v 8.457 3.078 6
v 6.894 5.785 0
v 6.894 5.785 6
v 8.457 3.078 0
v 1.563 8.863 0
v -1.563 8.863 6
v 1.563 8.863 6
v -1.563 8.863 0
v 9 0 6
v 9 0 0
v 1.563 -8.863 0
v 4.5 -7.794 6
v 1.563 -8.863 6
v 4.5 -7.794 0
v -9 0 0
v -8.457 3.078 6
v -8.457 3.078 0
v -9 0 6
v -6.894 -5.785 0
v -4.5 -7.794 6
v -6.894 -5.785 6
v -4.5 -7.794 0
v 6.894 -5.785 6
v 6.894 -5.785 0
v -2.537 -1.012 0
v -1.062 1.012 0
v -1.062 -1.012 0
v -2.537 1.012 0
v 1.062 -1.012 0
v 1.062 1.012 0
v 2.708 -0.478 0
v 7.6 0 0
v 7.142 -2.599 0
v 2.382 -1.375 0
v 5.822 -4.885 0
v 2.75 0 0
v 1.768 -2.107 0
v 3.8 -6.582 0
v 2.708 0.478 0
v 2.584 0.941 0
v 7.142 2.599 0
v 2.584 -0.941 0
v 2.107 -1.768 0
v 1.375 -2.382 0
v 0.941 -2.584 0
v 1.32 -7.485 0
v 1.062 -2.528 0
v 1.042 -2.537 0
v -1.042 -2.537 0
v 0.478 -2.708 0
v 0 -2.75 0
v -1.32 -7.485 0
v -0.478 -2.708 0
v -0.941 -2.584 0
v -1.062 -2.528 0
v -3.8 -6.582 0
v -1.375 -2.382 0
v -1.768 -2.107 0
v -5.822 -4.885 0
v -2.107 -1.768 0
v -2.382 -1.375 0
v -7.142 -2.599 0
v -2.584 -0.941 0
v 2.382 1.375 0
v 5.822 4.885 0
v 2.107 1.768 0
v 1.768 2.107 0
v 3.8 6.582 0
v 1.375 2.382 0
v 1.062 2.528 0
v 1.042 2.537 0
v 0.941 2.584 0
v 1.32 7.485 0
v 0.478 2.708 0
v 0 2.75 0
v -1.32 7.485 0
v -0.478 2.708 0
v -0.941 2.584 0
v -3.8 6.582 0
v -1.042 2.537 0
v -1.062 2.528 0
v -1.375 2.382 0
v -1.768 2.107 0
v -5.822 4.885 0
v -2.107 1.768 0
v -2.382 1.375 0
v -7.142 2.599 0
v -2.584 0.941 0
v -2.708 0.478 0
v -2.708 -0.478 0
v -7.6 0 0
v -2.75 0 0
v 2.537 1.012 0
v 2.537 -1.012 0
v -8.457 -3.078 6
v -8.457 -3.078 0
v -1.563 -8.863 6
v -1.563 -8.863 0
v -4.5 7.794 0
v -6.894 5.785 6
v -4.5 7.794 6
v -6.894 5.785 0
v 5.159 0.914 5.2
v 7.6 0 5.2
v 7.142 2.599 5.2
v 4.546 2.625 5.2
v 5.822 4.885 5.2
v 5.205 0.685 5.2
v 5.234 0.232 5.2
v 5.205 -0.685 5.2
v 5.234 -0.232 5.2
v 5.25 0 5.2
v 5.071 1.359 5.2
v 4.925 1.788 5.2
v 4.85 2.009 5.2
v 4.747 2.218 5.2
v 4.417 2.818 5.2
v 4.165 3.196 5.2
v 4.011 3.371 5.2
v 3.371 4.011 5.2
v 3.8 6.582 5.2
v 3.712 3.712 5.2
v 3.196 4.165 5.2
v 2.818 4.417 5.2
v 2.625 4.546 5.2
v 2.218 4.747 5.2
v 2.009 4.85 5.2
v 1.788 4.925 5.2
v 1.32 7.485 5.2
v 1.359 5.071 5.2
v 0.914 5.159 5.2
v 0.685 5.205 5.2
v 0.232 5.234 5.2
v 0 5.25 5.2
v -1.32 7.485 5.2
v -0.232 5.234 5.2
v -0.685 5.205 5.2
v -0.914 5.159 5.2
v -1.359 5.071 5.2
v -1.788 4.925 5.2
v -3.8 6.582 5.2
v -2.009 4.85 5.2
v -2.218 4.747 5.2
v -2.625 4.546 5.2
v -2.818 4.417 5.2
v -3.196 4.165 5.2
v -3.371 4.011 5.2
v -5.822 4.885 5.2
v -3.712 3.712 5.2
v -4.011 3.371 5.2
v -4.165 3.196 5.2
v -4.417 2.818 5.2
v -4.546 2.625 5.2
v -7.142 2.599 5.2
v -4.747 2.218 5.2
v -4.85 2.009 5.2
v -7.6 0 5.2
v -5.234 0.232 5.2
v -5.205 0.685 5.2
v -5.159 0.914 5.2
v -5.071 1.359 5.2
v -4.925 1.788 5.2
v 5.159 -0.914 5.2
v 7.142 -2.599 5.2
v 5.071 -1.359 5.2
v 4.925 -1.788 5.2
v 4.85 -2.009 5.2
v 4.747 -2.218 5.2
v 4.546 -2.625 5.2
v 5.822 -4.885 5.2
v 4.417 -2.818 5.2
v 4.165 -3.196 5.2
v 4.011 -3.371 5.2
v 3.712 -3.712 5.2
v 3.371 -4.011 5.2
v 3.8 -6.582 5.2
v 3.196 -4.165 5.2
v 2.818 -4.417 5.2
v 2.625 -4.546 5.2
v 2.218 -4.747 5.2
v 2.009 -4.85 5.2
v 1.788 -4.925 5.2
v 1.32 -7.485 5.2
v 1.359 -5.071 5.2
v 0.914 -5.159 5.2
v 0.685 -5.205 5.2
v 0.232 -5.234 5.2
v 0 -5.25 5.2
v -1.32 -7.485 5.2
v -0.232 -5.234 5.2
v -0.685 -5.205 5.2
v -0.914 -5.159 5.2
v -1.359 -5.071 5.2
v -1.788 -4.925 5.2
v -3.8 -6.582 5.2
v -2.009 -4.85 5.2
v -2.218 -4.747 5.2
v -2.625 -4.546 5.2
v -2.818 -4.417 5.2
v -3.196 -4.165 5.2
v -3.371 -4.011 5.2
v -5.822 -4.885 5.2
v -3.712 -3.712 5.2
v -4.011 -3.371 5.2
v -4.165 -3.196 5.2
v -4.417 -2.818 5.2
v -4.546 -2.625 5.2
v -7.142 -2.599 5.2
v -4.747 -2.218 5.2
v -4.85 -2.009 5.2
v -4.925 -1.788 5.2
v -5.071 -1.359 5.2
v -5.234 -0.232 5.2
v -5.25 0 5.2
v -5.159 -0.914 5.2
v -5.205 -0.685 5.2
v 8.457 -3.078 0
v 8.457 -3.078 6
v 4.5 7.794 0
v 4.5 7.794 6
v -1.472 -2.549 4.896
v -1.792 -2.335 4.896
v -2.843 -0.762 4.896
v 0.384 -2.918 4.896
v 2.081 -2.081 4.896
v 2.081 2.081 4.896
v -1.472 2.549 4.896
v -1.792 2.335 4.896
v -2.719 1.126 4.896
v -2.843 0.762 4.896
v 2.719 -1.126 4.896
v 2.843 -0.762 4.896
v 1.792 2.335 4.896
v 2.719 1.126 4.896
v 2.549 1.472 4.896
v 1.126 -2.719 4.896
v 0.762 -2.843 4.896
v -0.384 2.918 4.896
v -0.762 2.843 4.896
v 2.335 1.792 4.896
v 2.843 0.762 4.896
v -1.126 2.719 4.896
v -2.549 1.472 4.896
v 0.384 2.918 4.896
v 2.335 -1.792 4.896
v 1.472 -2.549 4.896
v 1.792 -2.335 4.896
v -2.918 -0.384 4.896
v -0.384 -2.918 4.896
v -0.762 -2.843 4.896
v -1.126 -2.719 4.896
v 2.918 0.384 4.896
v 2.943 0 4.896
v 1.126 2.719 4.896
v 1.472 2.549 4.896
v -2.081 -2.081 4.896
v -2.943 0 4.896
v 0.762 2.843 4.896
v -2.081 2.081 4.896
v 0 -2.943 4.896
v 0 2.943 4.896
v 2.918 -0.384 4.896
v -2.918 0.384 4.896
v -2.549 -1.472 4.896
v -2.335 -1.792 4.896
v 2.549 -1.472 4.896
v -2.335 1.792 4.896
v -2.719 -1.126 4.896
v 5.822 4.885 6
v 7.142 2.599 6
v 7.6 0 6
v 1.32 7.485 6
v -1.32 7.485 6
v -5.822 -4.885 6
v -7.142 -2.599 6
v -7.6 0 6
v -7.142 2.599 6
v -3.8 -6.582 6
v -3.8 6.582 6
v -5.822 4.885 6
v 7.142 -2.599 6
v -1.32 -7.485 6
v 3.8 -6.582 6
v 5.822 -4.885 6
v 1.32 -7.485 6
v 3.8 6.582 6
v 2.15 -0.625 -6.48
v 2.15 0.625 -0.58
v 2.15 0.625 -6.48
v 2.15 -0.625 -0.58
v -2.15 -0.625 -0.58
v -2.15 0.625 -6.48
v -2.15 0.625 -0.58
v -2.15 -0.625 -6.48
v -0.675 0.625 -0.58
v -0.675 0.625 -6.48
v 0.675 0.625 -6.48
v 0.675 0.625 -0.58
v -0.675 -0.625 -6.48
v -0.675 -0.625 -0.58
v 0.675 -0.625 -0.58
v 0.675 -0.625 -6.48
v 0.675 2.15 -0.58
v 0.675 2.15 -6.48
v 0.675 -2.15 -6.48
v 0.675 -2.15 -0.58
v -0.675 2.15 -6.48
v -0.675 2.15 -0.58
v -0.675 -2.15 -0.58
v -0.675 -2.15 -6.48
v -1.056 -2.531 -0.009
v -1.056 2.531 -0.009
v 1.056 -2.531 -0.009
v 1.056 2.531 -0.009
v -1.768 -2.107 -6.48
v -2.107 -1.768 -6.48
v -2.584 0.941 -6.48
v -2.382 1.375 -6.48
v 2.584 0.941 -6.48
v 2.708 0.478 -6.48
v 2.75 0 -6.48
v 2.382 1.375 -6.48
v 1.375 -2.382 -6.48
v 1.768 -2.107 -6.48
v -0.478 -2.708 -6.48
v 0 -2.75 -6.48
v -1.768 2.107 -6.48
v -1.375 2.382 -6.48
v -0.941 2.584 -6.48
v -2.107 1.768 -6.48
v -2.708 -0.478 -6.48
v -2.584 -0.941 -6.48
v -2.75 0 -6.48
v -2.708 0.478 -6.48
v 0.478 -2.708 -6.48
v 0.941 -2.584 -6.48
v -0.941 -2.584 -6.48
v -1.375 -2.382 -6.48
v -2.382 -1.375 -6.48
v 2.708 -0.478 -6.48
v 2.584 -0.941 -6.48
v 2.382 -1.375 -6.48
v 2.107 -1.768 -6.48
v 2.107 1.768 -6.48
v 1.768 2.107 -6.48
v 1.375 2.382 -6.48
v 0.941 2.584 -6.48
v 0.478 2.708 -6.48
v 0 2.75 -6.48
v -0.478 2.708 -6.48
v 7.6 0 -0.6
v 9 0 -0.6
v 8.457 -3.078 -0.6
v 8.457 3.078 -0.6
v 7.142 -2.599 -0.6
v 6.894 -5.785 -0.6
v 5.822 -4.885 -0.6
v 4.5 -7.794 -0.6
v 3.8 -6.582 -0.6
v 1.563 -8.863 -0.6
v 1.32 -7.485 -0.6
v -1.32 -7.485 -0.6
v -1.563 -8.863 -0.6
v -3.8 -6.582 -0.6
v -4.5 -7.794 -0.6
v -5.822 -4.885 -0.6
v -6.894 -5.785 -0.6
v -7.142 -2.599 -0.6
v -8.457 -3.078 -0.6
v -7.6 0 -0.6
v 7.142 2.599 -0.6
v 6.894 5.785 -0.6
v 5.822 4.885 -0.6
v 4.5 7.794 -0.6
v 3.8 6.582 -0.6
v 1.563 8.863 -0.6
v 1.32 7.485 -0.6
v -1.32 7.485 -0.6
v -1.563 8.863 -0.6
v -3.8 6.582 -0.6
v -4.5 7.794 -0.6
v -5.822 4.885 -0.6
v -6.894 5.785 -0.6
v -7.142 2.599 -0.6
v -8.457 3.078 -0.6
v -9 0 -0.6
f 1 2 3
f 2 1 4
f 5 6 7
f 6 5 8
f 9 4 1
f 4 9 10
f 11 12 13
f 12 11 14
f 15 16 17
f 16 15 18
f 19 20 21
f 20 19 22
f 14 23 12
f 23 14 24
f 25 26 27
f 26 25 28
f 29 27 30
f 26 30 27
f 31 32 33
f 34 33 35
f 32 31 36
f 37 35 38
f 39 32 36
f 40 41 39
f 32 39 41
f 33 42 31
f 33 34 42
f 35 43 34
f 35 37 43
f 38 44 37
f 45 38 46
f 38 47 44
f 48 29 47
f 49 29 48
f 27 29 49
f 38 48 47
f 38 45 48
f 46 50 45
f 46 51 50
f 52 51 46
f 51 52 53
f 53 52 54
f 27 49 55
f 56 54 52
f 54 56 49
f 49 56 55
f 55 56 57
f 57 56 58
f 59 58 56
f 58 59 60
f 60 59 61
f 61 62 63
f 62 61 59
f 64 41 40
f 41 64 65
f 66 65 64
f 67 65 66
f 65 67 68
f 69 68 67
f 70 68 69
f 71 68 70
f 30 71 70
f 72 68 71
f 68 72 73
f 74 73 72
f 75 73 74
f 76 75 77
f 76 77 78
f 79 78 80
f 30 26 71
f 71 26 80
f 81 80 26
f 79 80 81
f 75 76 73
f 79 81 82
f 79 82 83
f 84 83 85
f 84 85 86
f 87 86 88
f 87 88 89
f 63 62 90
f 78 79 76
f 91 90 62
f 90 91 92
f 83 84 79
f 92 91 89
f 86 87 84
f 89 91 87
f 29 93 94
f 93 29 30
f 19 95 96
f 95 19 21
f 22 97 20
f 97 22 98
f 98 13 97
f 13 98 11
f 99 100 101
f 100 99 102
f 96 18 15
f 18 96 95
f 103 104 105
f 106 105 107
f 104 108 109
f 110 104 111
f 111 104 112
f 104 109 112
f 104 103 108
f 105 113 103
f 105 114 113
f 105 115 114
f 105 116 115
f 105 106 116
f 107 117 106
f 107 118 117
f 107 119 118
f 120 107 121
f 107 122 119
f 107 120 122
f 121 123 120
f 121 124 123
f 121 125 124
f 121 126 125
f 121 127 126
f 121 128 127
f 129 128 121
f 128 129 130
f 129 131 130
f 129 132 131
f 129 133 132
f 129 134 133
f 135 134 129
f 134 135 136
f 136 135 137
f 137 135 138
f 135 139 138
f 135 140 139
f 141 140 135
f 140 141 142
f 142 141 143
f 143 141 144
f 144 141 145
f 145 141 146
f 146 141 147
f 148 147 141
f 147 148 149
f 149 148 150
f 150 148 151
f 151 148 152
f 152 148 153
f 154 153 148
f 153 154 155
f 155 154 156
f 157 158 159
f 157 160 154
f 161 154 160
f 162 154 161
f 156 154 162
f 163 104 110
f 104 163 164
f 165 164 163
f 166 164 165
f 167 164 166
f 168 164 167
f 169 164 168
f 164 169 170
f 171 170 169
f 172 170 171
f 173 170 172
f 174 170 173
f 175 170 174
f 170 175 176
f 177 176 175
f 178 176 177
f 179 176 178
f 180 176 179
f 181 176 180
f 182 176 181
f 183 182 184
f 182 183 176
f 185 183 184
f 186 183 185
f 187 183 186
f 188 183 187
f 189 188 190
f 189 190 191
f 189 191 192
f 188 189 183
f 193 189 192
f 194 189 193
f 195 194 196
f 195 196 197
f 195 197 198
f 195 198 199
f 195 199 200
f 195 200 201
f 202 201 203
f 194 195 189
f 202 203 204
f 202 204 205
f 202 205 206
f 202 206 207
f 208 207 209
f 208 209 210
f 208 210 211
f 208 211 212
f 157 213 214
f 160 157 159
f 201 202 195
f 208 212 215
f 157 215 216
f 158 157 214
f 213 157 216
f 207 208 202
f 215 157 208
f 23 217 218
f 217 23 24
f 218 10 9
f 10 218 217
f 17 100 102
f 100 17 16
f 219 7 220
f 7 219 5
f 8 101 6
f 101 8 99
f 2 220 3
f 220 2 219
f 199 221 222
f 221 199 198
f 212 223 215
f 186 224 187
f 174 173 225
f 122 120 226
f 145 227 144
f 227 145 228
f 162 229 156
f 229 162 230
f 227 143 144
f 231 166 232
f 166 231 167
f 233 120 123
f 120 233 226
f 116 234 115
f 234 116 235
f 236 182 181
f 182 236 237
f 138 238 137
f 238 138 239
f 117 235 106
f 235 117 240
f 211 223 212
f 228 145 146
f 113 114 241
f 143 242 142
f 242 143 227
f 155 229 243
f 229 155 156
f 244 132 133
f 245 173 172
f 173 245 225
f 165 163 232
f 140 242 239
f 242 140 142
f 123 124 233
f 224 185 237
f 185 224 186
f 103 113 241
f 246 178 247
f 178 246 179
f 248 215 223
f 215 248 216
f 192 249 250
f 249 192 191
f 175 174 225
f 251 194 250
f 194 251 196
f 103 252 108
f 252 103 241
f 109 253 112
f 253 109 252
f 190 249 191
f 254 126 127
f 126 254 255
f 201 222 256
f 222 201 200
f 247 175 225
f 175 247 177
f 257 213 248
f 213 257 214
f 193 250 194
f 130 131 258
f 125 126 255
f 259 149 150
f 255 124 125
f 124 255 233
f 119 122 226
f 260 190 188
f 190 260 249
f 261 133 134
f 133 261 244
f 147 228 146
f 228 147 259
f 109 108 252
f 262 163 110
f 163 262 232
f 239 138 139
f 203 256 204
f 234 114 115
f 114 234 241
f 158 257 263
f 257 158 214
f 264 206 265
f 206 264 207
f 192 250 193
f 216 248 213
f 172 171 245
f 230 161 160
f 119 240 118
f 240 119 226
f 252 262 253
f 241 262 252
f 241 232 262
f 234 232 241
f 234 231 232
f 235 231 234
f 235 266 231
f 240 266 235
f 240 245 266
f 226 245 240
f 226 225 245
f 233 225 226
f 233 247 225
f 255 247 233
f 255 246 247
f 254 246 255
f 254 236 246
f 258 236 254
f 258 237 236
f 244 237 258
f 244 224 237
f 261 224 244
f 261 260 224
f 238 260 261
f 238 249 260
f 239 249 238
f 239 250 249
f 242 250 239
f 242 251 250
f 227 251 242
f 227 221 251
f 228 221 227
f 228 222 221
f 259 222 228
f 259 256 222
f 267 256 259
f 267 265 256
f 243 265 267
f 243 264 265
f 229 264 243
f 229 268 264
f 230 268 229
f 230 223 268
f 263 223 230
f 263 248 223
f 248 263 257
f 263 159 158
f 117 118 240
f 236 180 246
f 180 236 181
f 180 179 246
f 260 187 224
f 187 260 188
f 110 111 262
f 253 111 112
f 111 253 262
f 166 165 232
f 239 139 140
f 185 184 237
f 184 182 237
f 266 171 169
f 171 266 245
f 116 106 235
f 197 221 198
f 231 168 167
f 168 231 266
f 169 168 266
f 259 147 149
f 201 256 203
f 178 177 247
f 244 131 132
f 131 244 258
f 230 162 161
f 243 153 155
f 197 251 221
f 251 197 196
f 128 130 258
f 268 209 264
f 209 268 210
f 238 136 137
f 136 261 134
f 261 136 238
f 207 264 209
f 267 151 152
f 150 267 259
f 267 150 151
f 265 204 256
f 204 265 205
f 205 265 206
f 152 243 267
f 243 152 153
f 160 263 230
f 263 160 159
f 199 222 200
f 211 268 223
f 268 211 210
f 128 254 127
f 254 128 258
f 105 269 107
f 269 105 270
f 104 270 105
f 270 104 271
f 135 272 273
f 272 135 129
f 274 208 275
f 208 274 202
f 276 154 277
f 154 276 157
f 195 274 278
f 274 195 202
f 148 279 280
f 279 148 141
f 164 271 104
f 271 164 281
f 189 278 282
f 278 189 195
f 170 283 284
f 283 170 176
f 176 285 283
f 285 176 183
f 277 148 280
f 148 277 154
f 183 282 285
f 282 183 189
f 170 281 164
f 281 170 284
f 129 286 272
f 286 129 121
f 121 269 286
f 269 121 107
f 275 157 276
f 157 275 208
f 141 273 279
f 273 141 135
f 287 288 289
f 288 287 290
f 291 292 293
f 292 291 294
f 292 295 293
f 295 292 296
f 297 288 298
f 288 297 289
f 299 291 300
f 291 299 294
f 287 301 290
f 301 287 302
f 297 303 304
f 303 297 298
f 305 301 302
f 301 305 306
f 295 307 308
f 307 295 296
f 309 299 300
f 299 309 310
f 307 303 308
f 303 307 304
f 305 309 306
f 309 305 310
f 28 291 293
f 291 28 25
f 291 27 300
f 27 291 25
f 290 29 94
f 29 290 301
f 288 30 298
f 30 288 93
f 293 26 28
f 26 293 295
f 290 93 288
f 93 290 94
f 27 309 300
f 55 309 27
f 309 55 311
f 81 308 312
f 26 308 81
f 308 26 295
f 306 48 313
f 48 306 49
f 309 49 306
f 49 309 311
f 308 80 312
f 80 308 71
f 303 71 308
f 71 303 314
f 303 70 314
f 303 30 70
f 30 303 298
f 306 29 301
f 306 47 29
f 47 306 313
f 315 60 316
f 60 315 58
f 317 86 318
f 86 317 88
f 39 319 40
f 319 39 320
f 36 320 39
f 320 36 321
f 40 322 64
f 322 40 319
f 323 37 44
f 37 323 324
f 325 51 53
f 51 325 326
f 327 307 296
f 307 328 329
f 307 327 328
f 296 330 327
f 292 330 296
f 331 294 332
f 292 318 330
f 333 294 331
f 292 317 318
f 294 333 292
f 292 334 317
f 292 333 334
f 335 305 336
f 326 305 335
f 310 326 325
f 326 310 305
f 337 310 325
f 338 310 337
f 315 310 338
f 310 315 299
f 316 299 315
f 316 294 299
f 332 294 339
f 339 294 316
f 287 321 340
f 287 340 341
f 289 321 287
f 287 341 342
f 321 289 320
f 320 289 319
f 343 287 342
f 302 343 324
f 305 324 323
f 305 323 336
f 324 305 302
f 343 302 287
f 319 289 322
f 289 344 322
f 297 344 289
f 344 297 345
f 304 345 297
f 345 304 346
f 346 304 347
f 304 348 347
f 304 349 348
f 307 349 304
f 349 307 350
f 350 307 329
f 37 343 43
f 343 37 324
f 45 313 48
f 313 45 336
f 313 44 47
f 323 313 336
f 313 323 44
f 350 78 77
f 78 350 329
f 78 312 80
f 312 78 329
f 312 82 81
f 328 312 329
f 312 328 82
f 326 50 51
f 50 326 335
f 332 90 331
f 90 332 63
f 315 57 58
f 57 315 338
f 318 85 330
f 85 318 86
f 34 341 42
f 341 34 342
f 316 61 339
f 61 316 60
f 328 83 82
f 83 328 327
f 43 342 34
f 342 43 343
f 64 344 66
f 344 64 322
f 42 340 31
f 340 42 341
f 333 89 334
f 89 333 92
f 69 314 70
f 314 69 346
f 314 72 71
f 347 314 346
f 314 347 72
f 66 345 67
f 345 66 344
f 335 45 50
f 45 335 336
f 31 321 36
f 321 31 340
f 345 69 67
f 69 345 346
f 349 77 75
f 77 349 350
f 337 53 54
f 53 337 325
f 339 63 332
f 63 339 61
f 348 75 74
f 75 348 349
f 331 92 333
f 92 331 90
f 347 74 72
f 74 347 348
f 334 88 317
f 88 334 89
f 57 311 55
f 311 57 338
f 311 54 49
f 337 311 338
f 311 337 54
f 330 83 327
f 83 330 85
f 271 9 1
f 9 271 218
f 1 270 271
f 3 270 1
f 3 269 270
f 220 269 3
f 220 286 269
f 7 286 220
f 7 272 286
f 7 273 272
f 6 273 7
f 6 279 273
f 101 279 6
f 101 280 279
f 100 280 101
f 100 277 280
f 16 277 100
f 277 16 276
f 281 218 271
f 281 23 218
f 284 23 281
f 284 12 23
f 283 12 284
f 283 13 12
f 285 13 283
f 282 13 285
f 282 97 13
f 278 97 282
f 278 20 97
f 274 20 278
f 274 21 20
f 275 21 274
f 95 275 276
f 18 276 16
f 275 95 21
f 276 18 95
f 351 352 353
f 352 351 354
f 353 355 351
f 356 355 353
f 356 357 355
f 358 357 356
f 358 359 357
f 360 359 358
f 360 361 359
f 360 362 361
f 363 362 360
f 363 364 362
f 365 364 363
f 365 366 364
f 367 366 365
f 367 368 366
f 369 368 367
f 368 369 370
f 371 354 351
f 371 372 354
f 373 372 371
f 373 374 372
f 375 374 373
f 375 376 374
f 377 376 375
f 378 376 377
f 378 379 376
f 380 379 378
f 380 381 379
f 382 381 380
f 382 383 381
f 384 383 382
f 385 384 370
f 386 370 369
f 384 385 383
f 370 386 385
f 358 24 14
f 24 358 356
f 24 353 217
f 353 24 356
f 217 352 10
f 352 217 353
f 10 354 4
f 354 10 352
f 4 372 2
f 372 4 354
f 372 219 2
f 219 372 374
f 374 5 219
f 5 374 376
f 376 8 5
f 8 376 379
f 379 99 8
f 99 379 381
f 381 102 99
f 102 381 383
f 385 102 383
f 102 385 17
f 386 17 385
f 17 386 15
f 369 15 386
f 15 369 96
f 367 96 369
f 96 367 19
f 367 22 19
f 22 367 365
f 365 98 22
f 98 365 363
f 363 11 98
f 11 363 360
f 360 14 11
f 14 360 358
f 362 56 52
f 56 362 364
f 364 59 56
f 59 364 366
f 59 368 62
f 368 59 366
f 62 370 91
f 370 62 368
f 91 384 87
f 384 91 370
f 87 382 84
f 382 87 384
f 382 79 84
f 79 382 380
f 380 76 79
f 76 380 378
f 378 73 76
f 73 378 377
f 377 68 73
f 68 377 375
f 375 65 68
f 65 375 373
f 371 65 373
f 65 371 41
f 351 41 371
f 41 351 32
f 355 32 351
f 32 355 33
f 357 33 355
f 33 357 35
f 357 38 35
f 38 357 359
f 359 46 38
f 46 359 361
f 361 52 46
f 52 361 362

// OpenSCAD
// file: ../modules/homing_bar.scad
function homing_bar_quality_steps(quality, preview_steps, export_steps) =
    quality == "preview" ? preview_steps : export_steps;

module homing_bar_profile(length, width, quality = "export") {
    end_steps = homing_bar_quality_steps(quality, 18, 32);
    cap_length = max(length, width);

    hull() {
        translate([-cap_length / 2 + width / 2, 0])
            circle(d = width, $fn = end_steps);
        translate([ cap_length / 2 - width / 2, 0])
            circle(d = width, $fn = end_steps);
    }
}

module homing_bar_blank(
    length,
    width,
    height,
    base_thickness,
    offset_y,
    base_z,
    quality = "export"
) {
    cap_height = max(height, 0.05);
    contact_height = max(base_thickness, 0.05);
    contact_length = length + contact_height * 1.6;
    contact_width = width + contact_height * 1.2;

    translate([0, offset_y, base_z])
        union() {
            hull() {
                linear_extrude(height = 0.01)
                    homing_bar_profile(contact_length, contact_width, quality);
                translate([0, 0, contact_height])
                    linear_extrude(height = 0.01)
                        homing_bar_profile(length, width, quality);
            }

            translate([0, 0, contact_height])
                linear_extrude(height = cap_height)
                    homing_bar_profile(length, width, quality);
        }
}
// file: ../modules/stem_alps.scad
function positive_alps_stem_dimension(value, minimum = 0.1) = max(value, minimum);

module alps_post(stem_length, stem_width, stem_height, lead_in) {
    safe_length = positive_alps_stem_dimension(stem_length);
    safe_width = positive_alps_stem_dimension(stem_width);
    safe_height = max(stem_height, 0.2);
    safe_lead_in = min(lead_in, safe_length * 0.2, safe_width * 0.3, safe_height * 0.4);

    hull() {
        linear_extrude(height = max(safe_height - safe_lead_in, 0.01))
            square([safe_length, safe_width], center = true);

        translate([0, 0, safe_height - 0.01])
            linear_extrude(height = 0.01)
                square([
                    positive_alps_stem_dimension(safe_length - safe_lead_in * 2),
                    positive_alps_stem_dimension(safe_width - safe_lead_in * 2)
                ], center = true);
    }
}

module stem_alps(
    stem_length = 4.45,
    stem_width = 2.25,
    stem_height = 3.5,
    base_clearance = 0,
    lead_in = 0.12,
    quality = "export"
) {
    translate([0, 0, base_clearance])
        alps_post(stem_length, stem_width, stem_height, lead_in);
}
// file: ../modules/stem_choc_v2.scad
use <stem_mx.scad>

module stem_choc_v2(
    outer_diameter = 5.5,
    stem_height = 6.5,
    base_clearance = 0,
    cross_width_horizontal = 1.25,
    cross_length_horizontal = 4.3,
    cross_width_vertical = 1.35,
    cross_length_vertical = 4.3,
    cross_chamfer = 0.4,
    chamfer_height = 0.6,
    quality = "export"
) {
    stem_mx(
        outer_diameter = outer_diameter,
        stem_height = stem_height,
        base_clearance = base_clearance,
        cross_width_horizontal = cross_width_horizontal,
        cross_length_horizontal = cross_length_horizontal,
        cross_width_vertical = cross_width_vertical,
        cross_length_vertical = cross_length_vertical,
        cross_chamfer = cross_chamfer,
        chamfer_height = chamfer_height,
        quality = quality
    );
}
// file: ../modules/stem_choc_v1.scad
function positive_choc_stem_dimension(value, minimum = 0.1) = max(value, minimum);

module choc_v1_prong(prong_width, prong_depth, prong_height, lead_in) {
    safe_width = positive_choc_stem_dimension(prong_width);
    safe_depth = positive_choc_stem_dimension(prong_depth);
    safe_height = max(prong_height, 0.2);
    safe_lead_in = min(lead_in, safe_width * 0.4, safe_depth * 0.2, safe_height * 0.4);

    hull() {
        linear_extrude(height = max(safe_height - safe_lead_in, 0.01))
            square([safe_width, safe_depth], center = true);

        translate([0, 0, safe_height - 0.01])
            linear_extrude(height = 0.01)
                square([
                    positive_choc_stem_dimension(safe_width - safe_lead_in * 2),
                    positive_choc_stem_dimension(safe_depth - safe_lead_in * 2)
                ], center = true);
    }
}

module stem_choc_v1(
    prong_width = 1.2,
    prong_depth = 3.0,
    prong_spacing = 5.7,
    stem_height = 3.0,
    base_clearance = 0,
    lead_in = 0.12,
    quality = "export"
) {
    for (offset_x = [prong_spacing / 2, -prong_spacing / 2]) {
        translate([offset_x, 0, base_clearance])
            choc_v1_prong(prong_width, prong_depth, stem_height, lead_in);
    }
}
// file: ../modules/stem_mx.scad
function stem_quality_steps(quality, preview_steps, export_steps) =
    quality == "preview" ? preview_steps : export_steps;

module stem_slot(length, width, height) {
    translate([-length / 2, -width / 2, 0])
        cube([length, width, height]);
}

module stem_mx(
    outer_diameter = 5.5,
    stem_height = 4.5,
    base_clearance = 0,
    cross_width_horizontal = 1.25,
    cross_length_horizontal = 4.3,
    cross_width_vertical = 1.35,
    cross_length_vertical = 4.3,
    cross_chamfer = 0.4,
    chamfer_height = 0.6,
    quality = "export"
) {
    outer_steps = stem_quality_steps(quality, 36, 64);
    safe_height = max(stem_height, 0.2);

    difference() {
        translate([0, 0, base_clearance])
            cylinder(d = outer_diameter, h = safe_height, $fn = outer_steps);

        translate([0, 0, base_clearance]) {
            stem_slot(cross_length_horizontal, cross_width_horizontal, safe_height + 1);
            stem_slot(cross_width_vertical, cross_length_vertical, safe_height + 1);
        }

        if (cross_chamfer > 0) {
            translate([0, 0, base_clearance - 0.01])
                hull() {
                    stem_slot(
                        cross_length_horizontal + cross_chamfer * 2,
                        cross_width_horizontal + cross_chamfer * 2,
                        0.01
                    );
                    translate([0, 0, chamfer_height])
                        stem_slot(cross_length_horizontal, cross_width_horizontal, 0.01);
                }

            translate([0, 0, base_clearance - 0.01])
                hull() {
                    stem_slot(
                        cross_width_vertical + cross_chamfer * 2,
                        cross_length_vertical + cross_chamfer * 2,
                        0.01
                    );
                    translate([0, 0, chamfer_height])
                        stem_slot(cross_width_vertical, cross_length_vertical, 0.01);
                }
        }
    }
}
// file: ../modules/legend_block.scad
function legend_quality_steps(quality, preview_steps, export_steps) =
    quality == "preview" ? preview_steps : export_steps;
function legend_text_curve_steps(quality = "export") =
    legend_quality_steps(quality, 48, 96);
function legend_text_internal_scale(quality = "export") =
    legend_quality_steps(quality, 6, 10);
// Keep legend size tied to the user's explicit control value without auto-fitting by label length.
function legend_text_size(depth) = max(depth, 0);

module legend_text_shape(label, size, font_name, curve_steps = 48) {
    text(
        text = label,
        size = size,
        font = font_name,
        halign = "center",
        valign = "center",
        $fn = curve_steps
    );
}

// Keep decoration options available across bundled fonts without requiring extra font files.
module legend_text_profile(
    label,
    size,
    font_name,
    outline_delta = 0,
    curve_steps = 48
) {
    if (abs(outline_delta) > 0.0001) {
        offset(delta = outline_delta)
            legend_text_shape(
                label = label,
                size = size,
                font_name = font_name,
                curve_steps = curve_steps
            );
    } else {
        legend_text_shape(
            label = label,
            size = size,
            font_name = font_name,
            curve_steps = curve_steps
        );
    }
}

module legend_block(
    label,
    width,
    depth,
    height,
    offset_x,
    offset_y,
    base_z,
    font_name = "M PLUS 1:style=Regular",
    underline_enabled = false,
    underline_width = 0,
    underline_thickness = 0,
    underline_offset_y = 0,
    outline_delta = 0,
    quality = "export"
) {
    if (!is_undef(label) && len(label) > 0) {
        size = legend_text_size(depth);
        curve_steps = legend_text_curve_steps(quality);
        internal_scale = legend_text_internal_scale(quality);

        translate([offset_x, offset_y, base_z])
            linear_extrude(height = height, center = false, convexity = 10)
                // Build glyph outlines at a larger internal scale so the bundled runtime
                // preserves more of the original font curvature before scaling back down.
                scale([1 / internal_scale, 1 / internal_scale, 1])
                    union() {
                        legend_text_profile(
                            label = label,
                            size = size * internal_scale,
                            font_name = font_name,
                            outline_delta = outline_delta * internal_scale,
                            curve_steps = curve_steps
                        );

                        if (underline_enabled && underline_width > 0 && underline_thickness > 0) {
                            translate([0, underline_offset_y * internal_scale])
                                square(
                                    [underline_width * internal_scale, underline_thickness * internal_scale],
                                    center = true
                                );
                        }
                    }
    }
}
// file: ../presets/stem-nominals.scad
stem_nominal_outer_diameter = 5.5;
legacy_stem_nominal_width = stem_nominal_outer_diameter;
legacy_stem_nominal_depth = stem_nominal_outer_diameter;
stem_nominal_height = 6.5;
stem_nominal_inset = 0;
stem_nominal_cross_width_horizontal = 1.25;
stem_nominal_cross_length_horizontal = 4.3;
stem_nominal_cross_width_vertical = 1.35;
stem_nominal_cross_length_vertical = 4.3;
stem_nominal_cross_chamfer = 0.4;

stem_mx_nominal_outer_diameter = 5.5;
stem_mx_nominal_height = 4.5;
stem_mx_nominal_inset = 0;
stem_mx_nominal_cross_width_horizontal = stem_nominal_cross_width_horizontal;
stem_mx_nominal_cross_length_horizontal = stem_nominal_cross_length_horizontal;
stem_mx_nominal_cross_width_vertical = stem_nominal_cross_width_vertical;
stem_mx_nominal_cross_length_vertical = stem_nominal_cross_length_vertical;
stem_mx_nominal_cross_chamfer = stem_nominal_cross_chamfer;

stem_choc_v2_nominal_outer_diameter = stem_nominal_outer_diameter;
stem_choc_v2_nominal_height = stem_nominal_height;
stem_choc_v2_nominal_inset = stem_nominal_inset;
stem_choc_v2_nominal_cross_width_horizontal = stem_nominal_cross_width_horizontal;
stem_choc_v2_nominal_cross_length_horizontal = stem_nominal_cross_length_horizontal;
stem_choc_v2_nominal_cross_width_vertical = stem_nominal_cross_width_vertical;
stem_choc_v2_nominal_cross_length_vertical = stem_nominal_cross_length_vertical;
stem_choc_v2_nominal_cross_chamfer = stem_nominal_cross_chamfer;

stem_choc_v1_nominal_height = 3.0;
stem_choc_v1_nominal_inset = 0;
stem_choc_v1_nominal_prong_width = 1.2;
stem_choc_v1_nominal_prong_depth = 3.0;
stem_choc_v1_nominal_prong_spacing = 5.7;
stem_choc_v1_nominal_lead_in = 0.12;

stem_alps_nominal_height = 3.5;
stem_alps_nominal_inset = 0;
stem_alps_nominal_length = 4.45;
stem_alps_nominal_width = 2.25;
stem_alps_nominal_lead_in = 0.12;
// file: common/typewriter-params.scad
user_shape_geometry_type = "typewriter";
user_key_width = 18;
user_key_depth = 18;
user_top_center_height = 5.2;
user_wall_thickness = 1.1;
user_top_scale = 1;
user_typewriter_corner_radius = 9;
user_profile_front_angle = 0;
user_profile_back_angle = 0;
user_profile_left_angle = 0;
user_profile_right_angle = 0;
user_top_thickness = 1.2;
user_bottom_corner_radius = 0;
user_top_corner_radius = 0;
user_dish_radius = 45;
user_dish_depth = 0;
user_top_pitch_deg = 0;
user_top_roll_deg = 0;
user_rim_enabled = false;
user_rim_width = 0;
user_rim_height_up = 0;
user_rim_height_down = 0;

user_legend_enabled = true;
user_legend_text = "A";
user_legend_font_name = "M PLUS 1:style=Regular";
user_legend_underline_enabled = false;
user_legend_underline_width = 0;
user_legend_underline_thickness = 0;
user_legend_underline_offset_y = 0;
user_legend_width = 7.2;
user_legend_depth = 4.0;
user_legend_height = 0;
user_legend_embed = 0.6;
user_legend_outline_delta = 0;
user_legend_offset_x = 0;
user_legend_offset_y = 0;

user_homing_bar_enabled = false;
user_homing_bar_height = 0.6;
user_homing_bar_length = 4.0;
user_homing_bar_width = 1.58;
user_homing_bar_offset_y = -3.5;
user_homing_bar_base_thickness = 0.35;

user_stem_type = "choc_v2";
user_stem_enabled = true;
user_stem_outer_delta = 0;
user_stem_cross_margin = 0;
user_stem_inset_delta = 0;
// main file
export_target = "preview";

include <common/typewriter-params.scad>

user_legend_enabled = false;
user_dish_depth = 0.4;
user_rim_enabled = true;
user_rim_width = 1.4;
user_rim_height_up = 0.8;
user_rim_height_down = 0.6;

include <../base/keycap.scad>
